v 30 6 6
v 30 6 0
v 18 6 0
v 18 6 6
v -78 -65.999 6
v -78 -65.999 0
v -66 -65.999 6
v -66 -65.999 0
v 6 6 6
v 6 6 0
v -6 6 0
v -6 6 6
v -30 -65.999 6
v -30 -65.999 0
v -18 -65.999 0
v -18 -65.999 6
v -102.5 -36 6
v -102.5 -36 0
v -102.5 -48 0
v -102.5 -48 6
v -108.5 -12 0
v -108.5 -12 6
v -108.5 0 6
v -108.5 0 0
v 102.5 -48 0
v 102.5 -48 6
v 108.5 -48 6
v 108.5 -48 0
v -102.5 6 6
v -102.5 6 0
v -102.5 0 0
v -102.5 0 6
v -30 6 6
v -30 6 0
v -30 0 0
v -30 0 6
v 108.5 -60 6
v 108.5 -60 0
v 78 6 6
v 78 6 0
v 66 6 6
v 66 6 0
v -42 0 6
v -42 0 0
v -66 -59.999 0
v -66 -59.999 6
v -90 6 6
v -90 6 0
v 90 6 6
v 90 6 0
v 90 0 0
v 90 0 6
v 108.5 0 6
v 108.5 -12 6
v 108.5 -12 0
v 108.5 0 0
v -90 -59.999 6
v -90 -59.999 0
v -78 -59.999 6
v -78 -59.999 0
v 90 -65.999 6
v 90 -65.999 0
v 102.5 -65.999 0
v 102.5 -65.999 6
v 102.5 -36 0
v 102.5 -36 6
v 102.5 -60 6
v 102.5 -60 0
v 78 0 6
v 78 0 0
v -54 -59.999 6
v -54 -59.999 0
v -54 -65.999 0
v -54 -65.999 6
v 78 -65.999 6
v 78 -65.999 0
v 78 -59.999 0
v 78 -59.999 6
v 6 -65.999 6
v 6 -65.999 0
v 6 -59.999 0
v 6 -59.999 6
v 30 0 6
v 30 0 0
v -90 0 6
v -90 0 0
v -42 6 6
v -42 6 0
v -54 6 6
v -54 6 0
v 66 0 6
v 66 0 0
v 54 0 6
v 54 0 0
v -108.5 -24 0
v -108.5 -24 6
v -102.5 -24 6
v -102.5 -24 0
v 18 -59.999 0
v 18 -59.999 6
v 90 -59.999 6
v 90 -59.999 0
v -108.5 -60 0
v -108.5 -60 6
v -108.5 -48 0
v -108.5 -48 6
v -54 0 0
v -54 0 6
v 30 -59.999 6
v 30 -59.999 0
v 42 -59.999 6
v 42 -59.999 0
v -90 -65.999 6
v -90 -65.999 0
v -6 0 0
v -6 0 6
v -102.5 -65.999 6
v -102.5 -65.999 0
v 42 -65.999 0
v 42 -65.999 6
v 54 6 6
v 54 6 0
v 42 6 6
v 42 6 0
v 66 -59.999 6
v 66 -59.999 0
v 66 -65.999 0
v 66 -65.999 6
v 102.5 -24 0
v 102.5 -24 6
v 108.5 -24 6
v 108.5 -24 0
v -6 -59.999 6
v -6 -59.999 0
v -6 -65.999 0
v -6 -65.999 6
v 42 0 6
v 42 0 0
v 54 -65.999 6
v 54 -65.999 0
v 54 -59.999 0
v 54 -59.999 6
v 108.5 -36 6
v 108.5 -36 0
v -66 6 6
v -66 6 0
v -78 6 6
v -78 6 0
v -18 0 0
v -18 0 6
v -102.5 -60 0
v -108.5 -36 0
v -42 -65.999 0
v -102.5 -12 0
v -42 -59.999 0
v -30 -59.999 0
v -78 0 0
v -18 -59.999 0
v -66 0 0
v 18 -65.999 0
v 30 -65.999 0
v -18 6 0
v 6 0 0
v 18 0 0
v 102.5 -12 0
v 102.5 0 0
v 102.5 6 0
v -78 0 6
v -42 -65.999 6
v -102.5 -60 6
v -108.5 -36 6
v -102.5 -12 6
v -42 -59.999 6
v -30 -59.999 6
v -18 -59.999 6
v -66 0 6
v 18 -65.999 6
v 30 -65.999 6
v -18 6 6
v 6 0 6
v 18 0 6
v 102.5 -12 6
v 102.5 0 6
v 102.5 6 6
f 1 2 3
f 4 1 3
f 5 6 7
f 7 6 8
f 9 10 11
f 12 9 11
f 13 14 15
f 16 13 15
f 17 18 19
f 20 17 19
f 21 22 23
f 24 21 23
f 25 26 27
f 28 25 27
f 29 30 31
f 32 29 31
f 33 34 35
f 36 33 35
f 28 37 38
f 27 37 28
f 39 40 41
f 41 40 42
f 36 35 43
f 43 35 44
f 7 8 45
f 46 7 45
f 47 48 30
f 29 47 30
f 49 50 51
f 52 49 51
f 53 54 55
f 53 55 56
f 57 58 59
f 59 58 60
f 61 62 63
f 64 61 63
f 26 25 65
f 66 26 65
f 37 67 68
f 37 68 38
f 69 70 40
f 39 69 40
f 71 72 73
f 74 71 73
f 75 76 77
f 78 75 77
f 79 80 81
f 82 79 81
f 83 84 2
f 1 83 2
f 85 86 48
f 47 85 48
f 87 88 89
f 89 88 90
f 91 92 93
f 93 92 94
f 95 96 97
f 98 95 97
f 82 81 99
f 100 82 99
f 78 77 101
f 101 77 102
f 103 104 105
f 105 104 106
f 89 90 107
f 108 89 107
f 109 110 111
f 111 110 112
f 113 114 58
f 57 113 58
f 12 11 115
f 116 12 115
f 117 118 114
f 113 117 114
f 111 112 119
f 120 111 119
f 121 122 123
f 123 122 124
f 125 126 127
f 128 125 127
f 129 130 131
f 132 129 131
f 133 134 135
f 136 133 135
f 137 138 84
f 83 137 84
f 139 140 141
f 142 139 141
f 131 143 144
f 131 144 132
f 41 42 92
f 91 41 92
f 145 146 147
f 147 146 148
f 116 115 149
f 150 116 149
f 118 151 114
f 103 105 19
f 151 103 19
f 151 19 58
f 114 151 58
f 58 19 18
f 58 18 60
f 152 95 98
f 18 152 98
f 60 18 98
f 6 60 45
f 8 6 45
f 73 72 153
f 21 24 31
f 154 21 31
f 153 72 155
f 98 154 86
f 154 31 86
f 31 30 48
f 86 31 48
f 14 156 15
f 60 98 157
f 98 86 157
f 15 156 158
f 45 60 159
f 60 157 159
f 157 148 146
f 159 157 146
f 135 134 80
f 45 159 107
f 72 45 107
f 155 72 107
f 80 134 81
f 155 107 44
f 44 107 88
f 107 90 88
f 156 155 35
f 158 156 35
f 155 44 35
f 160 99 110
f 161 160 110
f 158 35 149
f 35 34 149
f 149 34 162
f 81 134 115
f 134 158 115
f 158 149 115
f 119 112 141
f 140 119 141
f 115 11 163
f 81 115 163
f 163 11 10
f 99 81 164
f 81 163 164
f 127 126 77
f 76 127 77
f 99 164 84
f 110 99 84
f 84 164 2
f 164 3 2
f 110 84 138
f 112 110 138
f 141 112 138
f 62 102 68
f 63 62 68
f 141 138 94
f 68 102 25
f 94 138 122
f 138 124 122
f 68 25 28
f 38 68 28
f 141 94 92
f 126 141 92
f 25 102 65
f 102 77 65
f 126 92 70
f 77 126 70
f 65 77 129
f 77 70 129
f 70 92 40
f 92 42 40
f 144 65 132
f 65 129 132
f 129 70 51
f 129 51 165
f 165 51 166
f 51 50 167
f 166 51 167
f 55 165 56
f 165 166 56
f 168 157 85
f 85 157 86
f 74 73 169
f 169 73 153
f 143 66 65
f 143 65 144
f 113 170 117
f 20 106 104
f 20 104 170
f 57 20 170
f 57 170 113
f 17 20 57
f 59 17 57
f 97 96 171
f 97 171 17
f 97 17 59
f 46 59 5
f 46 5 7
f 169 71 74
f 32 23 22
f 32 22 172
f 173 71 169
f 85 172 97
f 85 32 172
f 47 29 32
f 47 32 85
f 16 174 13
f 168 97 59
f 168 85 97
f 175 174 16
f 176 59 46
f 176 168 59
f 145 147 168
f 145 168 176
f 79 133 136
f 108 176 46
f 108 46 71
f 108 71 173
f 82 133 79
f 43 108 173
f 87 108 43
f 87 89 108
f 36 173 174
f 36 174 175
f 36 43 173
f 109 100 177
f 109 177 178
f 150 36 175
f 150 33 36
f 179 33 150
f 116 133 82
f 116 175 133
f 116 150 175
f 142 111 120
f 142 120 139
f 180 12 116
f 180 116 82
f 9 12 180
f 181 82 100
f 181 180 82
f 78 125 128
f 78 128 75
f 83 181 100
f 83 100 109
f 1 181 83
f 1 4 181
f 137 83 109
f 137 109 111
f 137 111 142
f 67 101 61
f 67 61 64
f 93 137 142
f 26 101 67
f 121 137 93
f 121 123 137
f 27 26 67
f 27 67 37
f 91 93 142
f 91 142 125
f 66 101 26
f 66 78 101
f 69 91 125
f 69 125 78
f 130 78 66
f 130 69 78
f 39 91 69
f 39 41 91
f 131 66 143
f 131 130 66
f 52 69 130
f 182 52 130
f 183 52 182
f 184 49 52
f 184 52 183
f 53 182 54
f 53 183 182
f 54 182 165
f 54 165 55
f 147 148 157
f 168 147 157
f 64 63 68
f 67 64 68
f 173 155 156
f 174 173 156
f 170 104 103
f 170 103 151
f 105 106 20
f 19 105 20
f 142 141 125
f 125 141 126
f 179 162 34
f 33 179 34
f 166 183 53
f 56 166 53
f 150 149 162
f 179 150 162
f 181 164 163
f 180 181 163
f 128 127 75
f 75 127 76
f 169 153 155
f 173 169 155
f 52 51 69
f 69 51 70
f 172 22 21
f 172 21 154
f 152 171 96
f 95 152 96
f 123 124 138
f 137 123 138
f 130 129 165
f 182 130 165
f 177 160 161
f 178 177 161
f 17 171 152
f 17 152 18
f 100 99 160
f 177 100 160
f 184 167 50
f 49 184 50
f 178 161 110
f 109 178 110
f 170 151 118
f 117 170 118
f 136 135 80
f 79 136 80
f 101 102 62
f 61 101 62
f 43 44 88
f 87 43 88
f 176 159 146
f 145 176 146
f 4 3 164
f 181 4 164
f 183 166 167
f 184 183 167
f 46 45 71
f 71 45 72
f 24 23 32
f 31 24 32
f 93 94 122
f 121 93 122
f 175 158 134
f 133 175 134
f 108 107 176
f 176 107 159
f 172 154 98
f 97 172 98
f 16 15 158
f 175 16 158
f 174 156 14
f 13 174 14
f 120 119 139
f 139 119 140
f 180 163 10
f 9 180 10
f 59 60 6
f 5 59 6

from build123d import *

# Parameters (mm, degrees)
BOSS_EXTRUDE1_DEPTH = 6
SKETCH3_W           = 6
SKETCH3_H           = 12
BOSS_EXTRUDE2_DEPTH = 6


with BuildPart() as part:
    # Sketch2 → Boss-Extrude1 (new body)
    with BuildSketch(Plane.XY):
        Polygon((-66, 6), (-78, 6), (-78, 0), (-90, 0), (-90, 6), (-102.5, 6), (-102.5, -65.99938194), (-90, -65.99938194), (-90, -59.99938194), (-78, -59.99938194), (-78, -65.99938194), (-66, -65.99938194), (-66, -59.99938194), (-54, -59.99938194), (-54, -65.99938194), (-42, -65.99938194), (-42, -59.99938194), (-30, -59.99938194), (-30, -65.99938194), (-18, -65.99938194), (-18, -59.99938194), (-6, -59.99938194), (-6, -65.99938194), (6, -65.99938194), (6, -59.99938194), (18, -59.99938194), (18, -65.99938194), (30, -65.99938194), (30, -59.99938194), (42, -59.99938194), (42, -65.99938194), (54, -65.99938194), (54, -59.99938194), (66, -59.99938194), (66, -65.99938194), (78, -65.99938194), (78, -59.99938194), (90, -59.99938194), (90, -65.99938194), (102.5, -65.99938194), (102.5, 6), (90, 6), (90, 0), (78, 0), (78, 6), (66, 6), (66, 0), (54, 0), (54, 6), (42, 6), (42, 0), (30, 0), (30, 6), (18, 6), (18, 0), (6, 0), (6, 6), (-6, 6), (-6, 0), (-18, 0), (-18, 6), (-30, 6), (-30, 0), (-42, 0), (-42, 6), (-54, 6), (-54, 0), (-66, 0), align=None)
    extrude(amount=BOSS_EXTRUDE1_DEPTH)

    # Sketch3 → Boss-Extrude2 (add)
    with BuildSketch(Plane.XY.offset(6)):
        with Locations((-105.5, -6)):
            Rectangle(SKETCH3_W, SKETCH3_H)
        with Locations((105.5, -6)):
            Rectangle(SKETCH3_W, SKETCH3_H)
        with Locations((105.5, -30)):
            Rectangle(SKETCH3_W, SKETCH3_H)
        with Locations((105.5, -54)):
            Rectangle(SKETCH3_W, SKETCH3_H)
        with Locations((-105.5, -30)):
            Rectangle(SKETCH3_W, SKETCH3_H)
        with Locations((-105.5, -54)):
            Rectangle(SKETCH3_W, SKETCH3_H)
    extrude(amount=-BOSS_EXTRUDE2_DEPTH)


solid = part.part
